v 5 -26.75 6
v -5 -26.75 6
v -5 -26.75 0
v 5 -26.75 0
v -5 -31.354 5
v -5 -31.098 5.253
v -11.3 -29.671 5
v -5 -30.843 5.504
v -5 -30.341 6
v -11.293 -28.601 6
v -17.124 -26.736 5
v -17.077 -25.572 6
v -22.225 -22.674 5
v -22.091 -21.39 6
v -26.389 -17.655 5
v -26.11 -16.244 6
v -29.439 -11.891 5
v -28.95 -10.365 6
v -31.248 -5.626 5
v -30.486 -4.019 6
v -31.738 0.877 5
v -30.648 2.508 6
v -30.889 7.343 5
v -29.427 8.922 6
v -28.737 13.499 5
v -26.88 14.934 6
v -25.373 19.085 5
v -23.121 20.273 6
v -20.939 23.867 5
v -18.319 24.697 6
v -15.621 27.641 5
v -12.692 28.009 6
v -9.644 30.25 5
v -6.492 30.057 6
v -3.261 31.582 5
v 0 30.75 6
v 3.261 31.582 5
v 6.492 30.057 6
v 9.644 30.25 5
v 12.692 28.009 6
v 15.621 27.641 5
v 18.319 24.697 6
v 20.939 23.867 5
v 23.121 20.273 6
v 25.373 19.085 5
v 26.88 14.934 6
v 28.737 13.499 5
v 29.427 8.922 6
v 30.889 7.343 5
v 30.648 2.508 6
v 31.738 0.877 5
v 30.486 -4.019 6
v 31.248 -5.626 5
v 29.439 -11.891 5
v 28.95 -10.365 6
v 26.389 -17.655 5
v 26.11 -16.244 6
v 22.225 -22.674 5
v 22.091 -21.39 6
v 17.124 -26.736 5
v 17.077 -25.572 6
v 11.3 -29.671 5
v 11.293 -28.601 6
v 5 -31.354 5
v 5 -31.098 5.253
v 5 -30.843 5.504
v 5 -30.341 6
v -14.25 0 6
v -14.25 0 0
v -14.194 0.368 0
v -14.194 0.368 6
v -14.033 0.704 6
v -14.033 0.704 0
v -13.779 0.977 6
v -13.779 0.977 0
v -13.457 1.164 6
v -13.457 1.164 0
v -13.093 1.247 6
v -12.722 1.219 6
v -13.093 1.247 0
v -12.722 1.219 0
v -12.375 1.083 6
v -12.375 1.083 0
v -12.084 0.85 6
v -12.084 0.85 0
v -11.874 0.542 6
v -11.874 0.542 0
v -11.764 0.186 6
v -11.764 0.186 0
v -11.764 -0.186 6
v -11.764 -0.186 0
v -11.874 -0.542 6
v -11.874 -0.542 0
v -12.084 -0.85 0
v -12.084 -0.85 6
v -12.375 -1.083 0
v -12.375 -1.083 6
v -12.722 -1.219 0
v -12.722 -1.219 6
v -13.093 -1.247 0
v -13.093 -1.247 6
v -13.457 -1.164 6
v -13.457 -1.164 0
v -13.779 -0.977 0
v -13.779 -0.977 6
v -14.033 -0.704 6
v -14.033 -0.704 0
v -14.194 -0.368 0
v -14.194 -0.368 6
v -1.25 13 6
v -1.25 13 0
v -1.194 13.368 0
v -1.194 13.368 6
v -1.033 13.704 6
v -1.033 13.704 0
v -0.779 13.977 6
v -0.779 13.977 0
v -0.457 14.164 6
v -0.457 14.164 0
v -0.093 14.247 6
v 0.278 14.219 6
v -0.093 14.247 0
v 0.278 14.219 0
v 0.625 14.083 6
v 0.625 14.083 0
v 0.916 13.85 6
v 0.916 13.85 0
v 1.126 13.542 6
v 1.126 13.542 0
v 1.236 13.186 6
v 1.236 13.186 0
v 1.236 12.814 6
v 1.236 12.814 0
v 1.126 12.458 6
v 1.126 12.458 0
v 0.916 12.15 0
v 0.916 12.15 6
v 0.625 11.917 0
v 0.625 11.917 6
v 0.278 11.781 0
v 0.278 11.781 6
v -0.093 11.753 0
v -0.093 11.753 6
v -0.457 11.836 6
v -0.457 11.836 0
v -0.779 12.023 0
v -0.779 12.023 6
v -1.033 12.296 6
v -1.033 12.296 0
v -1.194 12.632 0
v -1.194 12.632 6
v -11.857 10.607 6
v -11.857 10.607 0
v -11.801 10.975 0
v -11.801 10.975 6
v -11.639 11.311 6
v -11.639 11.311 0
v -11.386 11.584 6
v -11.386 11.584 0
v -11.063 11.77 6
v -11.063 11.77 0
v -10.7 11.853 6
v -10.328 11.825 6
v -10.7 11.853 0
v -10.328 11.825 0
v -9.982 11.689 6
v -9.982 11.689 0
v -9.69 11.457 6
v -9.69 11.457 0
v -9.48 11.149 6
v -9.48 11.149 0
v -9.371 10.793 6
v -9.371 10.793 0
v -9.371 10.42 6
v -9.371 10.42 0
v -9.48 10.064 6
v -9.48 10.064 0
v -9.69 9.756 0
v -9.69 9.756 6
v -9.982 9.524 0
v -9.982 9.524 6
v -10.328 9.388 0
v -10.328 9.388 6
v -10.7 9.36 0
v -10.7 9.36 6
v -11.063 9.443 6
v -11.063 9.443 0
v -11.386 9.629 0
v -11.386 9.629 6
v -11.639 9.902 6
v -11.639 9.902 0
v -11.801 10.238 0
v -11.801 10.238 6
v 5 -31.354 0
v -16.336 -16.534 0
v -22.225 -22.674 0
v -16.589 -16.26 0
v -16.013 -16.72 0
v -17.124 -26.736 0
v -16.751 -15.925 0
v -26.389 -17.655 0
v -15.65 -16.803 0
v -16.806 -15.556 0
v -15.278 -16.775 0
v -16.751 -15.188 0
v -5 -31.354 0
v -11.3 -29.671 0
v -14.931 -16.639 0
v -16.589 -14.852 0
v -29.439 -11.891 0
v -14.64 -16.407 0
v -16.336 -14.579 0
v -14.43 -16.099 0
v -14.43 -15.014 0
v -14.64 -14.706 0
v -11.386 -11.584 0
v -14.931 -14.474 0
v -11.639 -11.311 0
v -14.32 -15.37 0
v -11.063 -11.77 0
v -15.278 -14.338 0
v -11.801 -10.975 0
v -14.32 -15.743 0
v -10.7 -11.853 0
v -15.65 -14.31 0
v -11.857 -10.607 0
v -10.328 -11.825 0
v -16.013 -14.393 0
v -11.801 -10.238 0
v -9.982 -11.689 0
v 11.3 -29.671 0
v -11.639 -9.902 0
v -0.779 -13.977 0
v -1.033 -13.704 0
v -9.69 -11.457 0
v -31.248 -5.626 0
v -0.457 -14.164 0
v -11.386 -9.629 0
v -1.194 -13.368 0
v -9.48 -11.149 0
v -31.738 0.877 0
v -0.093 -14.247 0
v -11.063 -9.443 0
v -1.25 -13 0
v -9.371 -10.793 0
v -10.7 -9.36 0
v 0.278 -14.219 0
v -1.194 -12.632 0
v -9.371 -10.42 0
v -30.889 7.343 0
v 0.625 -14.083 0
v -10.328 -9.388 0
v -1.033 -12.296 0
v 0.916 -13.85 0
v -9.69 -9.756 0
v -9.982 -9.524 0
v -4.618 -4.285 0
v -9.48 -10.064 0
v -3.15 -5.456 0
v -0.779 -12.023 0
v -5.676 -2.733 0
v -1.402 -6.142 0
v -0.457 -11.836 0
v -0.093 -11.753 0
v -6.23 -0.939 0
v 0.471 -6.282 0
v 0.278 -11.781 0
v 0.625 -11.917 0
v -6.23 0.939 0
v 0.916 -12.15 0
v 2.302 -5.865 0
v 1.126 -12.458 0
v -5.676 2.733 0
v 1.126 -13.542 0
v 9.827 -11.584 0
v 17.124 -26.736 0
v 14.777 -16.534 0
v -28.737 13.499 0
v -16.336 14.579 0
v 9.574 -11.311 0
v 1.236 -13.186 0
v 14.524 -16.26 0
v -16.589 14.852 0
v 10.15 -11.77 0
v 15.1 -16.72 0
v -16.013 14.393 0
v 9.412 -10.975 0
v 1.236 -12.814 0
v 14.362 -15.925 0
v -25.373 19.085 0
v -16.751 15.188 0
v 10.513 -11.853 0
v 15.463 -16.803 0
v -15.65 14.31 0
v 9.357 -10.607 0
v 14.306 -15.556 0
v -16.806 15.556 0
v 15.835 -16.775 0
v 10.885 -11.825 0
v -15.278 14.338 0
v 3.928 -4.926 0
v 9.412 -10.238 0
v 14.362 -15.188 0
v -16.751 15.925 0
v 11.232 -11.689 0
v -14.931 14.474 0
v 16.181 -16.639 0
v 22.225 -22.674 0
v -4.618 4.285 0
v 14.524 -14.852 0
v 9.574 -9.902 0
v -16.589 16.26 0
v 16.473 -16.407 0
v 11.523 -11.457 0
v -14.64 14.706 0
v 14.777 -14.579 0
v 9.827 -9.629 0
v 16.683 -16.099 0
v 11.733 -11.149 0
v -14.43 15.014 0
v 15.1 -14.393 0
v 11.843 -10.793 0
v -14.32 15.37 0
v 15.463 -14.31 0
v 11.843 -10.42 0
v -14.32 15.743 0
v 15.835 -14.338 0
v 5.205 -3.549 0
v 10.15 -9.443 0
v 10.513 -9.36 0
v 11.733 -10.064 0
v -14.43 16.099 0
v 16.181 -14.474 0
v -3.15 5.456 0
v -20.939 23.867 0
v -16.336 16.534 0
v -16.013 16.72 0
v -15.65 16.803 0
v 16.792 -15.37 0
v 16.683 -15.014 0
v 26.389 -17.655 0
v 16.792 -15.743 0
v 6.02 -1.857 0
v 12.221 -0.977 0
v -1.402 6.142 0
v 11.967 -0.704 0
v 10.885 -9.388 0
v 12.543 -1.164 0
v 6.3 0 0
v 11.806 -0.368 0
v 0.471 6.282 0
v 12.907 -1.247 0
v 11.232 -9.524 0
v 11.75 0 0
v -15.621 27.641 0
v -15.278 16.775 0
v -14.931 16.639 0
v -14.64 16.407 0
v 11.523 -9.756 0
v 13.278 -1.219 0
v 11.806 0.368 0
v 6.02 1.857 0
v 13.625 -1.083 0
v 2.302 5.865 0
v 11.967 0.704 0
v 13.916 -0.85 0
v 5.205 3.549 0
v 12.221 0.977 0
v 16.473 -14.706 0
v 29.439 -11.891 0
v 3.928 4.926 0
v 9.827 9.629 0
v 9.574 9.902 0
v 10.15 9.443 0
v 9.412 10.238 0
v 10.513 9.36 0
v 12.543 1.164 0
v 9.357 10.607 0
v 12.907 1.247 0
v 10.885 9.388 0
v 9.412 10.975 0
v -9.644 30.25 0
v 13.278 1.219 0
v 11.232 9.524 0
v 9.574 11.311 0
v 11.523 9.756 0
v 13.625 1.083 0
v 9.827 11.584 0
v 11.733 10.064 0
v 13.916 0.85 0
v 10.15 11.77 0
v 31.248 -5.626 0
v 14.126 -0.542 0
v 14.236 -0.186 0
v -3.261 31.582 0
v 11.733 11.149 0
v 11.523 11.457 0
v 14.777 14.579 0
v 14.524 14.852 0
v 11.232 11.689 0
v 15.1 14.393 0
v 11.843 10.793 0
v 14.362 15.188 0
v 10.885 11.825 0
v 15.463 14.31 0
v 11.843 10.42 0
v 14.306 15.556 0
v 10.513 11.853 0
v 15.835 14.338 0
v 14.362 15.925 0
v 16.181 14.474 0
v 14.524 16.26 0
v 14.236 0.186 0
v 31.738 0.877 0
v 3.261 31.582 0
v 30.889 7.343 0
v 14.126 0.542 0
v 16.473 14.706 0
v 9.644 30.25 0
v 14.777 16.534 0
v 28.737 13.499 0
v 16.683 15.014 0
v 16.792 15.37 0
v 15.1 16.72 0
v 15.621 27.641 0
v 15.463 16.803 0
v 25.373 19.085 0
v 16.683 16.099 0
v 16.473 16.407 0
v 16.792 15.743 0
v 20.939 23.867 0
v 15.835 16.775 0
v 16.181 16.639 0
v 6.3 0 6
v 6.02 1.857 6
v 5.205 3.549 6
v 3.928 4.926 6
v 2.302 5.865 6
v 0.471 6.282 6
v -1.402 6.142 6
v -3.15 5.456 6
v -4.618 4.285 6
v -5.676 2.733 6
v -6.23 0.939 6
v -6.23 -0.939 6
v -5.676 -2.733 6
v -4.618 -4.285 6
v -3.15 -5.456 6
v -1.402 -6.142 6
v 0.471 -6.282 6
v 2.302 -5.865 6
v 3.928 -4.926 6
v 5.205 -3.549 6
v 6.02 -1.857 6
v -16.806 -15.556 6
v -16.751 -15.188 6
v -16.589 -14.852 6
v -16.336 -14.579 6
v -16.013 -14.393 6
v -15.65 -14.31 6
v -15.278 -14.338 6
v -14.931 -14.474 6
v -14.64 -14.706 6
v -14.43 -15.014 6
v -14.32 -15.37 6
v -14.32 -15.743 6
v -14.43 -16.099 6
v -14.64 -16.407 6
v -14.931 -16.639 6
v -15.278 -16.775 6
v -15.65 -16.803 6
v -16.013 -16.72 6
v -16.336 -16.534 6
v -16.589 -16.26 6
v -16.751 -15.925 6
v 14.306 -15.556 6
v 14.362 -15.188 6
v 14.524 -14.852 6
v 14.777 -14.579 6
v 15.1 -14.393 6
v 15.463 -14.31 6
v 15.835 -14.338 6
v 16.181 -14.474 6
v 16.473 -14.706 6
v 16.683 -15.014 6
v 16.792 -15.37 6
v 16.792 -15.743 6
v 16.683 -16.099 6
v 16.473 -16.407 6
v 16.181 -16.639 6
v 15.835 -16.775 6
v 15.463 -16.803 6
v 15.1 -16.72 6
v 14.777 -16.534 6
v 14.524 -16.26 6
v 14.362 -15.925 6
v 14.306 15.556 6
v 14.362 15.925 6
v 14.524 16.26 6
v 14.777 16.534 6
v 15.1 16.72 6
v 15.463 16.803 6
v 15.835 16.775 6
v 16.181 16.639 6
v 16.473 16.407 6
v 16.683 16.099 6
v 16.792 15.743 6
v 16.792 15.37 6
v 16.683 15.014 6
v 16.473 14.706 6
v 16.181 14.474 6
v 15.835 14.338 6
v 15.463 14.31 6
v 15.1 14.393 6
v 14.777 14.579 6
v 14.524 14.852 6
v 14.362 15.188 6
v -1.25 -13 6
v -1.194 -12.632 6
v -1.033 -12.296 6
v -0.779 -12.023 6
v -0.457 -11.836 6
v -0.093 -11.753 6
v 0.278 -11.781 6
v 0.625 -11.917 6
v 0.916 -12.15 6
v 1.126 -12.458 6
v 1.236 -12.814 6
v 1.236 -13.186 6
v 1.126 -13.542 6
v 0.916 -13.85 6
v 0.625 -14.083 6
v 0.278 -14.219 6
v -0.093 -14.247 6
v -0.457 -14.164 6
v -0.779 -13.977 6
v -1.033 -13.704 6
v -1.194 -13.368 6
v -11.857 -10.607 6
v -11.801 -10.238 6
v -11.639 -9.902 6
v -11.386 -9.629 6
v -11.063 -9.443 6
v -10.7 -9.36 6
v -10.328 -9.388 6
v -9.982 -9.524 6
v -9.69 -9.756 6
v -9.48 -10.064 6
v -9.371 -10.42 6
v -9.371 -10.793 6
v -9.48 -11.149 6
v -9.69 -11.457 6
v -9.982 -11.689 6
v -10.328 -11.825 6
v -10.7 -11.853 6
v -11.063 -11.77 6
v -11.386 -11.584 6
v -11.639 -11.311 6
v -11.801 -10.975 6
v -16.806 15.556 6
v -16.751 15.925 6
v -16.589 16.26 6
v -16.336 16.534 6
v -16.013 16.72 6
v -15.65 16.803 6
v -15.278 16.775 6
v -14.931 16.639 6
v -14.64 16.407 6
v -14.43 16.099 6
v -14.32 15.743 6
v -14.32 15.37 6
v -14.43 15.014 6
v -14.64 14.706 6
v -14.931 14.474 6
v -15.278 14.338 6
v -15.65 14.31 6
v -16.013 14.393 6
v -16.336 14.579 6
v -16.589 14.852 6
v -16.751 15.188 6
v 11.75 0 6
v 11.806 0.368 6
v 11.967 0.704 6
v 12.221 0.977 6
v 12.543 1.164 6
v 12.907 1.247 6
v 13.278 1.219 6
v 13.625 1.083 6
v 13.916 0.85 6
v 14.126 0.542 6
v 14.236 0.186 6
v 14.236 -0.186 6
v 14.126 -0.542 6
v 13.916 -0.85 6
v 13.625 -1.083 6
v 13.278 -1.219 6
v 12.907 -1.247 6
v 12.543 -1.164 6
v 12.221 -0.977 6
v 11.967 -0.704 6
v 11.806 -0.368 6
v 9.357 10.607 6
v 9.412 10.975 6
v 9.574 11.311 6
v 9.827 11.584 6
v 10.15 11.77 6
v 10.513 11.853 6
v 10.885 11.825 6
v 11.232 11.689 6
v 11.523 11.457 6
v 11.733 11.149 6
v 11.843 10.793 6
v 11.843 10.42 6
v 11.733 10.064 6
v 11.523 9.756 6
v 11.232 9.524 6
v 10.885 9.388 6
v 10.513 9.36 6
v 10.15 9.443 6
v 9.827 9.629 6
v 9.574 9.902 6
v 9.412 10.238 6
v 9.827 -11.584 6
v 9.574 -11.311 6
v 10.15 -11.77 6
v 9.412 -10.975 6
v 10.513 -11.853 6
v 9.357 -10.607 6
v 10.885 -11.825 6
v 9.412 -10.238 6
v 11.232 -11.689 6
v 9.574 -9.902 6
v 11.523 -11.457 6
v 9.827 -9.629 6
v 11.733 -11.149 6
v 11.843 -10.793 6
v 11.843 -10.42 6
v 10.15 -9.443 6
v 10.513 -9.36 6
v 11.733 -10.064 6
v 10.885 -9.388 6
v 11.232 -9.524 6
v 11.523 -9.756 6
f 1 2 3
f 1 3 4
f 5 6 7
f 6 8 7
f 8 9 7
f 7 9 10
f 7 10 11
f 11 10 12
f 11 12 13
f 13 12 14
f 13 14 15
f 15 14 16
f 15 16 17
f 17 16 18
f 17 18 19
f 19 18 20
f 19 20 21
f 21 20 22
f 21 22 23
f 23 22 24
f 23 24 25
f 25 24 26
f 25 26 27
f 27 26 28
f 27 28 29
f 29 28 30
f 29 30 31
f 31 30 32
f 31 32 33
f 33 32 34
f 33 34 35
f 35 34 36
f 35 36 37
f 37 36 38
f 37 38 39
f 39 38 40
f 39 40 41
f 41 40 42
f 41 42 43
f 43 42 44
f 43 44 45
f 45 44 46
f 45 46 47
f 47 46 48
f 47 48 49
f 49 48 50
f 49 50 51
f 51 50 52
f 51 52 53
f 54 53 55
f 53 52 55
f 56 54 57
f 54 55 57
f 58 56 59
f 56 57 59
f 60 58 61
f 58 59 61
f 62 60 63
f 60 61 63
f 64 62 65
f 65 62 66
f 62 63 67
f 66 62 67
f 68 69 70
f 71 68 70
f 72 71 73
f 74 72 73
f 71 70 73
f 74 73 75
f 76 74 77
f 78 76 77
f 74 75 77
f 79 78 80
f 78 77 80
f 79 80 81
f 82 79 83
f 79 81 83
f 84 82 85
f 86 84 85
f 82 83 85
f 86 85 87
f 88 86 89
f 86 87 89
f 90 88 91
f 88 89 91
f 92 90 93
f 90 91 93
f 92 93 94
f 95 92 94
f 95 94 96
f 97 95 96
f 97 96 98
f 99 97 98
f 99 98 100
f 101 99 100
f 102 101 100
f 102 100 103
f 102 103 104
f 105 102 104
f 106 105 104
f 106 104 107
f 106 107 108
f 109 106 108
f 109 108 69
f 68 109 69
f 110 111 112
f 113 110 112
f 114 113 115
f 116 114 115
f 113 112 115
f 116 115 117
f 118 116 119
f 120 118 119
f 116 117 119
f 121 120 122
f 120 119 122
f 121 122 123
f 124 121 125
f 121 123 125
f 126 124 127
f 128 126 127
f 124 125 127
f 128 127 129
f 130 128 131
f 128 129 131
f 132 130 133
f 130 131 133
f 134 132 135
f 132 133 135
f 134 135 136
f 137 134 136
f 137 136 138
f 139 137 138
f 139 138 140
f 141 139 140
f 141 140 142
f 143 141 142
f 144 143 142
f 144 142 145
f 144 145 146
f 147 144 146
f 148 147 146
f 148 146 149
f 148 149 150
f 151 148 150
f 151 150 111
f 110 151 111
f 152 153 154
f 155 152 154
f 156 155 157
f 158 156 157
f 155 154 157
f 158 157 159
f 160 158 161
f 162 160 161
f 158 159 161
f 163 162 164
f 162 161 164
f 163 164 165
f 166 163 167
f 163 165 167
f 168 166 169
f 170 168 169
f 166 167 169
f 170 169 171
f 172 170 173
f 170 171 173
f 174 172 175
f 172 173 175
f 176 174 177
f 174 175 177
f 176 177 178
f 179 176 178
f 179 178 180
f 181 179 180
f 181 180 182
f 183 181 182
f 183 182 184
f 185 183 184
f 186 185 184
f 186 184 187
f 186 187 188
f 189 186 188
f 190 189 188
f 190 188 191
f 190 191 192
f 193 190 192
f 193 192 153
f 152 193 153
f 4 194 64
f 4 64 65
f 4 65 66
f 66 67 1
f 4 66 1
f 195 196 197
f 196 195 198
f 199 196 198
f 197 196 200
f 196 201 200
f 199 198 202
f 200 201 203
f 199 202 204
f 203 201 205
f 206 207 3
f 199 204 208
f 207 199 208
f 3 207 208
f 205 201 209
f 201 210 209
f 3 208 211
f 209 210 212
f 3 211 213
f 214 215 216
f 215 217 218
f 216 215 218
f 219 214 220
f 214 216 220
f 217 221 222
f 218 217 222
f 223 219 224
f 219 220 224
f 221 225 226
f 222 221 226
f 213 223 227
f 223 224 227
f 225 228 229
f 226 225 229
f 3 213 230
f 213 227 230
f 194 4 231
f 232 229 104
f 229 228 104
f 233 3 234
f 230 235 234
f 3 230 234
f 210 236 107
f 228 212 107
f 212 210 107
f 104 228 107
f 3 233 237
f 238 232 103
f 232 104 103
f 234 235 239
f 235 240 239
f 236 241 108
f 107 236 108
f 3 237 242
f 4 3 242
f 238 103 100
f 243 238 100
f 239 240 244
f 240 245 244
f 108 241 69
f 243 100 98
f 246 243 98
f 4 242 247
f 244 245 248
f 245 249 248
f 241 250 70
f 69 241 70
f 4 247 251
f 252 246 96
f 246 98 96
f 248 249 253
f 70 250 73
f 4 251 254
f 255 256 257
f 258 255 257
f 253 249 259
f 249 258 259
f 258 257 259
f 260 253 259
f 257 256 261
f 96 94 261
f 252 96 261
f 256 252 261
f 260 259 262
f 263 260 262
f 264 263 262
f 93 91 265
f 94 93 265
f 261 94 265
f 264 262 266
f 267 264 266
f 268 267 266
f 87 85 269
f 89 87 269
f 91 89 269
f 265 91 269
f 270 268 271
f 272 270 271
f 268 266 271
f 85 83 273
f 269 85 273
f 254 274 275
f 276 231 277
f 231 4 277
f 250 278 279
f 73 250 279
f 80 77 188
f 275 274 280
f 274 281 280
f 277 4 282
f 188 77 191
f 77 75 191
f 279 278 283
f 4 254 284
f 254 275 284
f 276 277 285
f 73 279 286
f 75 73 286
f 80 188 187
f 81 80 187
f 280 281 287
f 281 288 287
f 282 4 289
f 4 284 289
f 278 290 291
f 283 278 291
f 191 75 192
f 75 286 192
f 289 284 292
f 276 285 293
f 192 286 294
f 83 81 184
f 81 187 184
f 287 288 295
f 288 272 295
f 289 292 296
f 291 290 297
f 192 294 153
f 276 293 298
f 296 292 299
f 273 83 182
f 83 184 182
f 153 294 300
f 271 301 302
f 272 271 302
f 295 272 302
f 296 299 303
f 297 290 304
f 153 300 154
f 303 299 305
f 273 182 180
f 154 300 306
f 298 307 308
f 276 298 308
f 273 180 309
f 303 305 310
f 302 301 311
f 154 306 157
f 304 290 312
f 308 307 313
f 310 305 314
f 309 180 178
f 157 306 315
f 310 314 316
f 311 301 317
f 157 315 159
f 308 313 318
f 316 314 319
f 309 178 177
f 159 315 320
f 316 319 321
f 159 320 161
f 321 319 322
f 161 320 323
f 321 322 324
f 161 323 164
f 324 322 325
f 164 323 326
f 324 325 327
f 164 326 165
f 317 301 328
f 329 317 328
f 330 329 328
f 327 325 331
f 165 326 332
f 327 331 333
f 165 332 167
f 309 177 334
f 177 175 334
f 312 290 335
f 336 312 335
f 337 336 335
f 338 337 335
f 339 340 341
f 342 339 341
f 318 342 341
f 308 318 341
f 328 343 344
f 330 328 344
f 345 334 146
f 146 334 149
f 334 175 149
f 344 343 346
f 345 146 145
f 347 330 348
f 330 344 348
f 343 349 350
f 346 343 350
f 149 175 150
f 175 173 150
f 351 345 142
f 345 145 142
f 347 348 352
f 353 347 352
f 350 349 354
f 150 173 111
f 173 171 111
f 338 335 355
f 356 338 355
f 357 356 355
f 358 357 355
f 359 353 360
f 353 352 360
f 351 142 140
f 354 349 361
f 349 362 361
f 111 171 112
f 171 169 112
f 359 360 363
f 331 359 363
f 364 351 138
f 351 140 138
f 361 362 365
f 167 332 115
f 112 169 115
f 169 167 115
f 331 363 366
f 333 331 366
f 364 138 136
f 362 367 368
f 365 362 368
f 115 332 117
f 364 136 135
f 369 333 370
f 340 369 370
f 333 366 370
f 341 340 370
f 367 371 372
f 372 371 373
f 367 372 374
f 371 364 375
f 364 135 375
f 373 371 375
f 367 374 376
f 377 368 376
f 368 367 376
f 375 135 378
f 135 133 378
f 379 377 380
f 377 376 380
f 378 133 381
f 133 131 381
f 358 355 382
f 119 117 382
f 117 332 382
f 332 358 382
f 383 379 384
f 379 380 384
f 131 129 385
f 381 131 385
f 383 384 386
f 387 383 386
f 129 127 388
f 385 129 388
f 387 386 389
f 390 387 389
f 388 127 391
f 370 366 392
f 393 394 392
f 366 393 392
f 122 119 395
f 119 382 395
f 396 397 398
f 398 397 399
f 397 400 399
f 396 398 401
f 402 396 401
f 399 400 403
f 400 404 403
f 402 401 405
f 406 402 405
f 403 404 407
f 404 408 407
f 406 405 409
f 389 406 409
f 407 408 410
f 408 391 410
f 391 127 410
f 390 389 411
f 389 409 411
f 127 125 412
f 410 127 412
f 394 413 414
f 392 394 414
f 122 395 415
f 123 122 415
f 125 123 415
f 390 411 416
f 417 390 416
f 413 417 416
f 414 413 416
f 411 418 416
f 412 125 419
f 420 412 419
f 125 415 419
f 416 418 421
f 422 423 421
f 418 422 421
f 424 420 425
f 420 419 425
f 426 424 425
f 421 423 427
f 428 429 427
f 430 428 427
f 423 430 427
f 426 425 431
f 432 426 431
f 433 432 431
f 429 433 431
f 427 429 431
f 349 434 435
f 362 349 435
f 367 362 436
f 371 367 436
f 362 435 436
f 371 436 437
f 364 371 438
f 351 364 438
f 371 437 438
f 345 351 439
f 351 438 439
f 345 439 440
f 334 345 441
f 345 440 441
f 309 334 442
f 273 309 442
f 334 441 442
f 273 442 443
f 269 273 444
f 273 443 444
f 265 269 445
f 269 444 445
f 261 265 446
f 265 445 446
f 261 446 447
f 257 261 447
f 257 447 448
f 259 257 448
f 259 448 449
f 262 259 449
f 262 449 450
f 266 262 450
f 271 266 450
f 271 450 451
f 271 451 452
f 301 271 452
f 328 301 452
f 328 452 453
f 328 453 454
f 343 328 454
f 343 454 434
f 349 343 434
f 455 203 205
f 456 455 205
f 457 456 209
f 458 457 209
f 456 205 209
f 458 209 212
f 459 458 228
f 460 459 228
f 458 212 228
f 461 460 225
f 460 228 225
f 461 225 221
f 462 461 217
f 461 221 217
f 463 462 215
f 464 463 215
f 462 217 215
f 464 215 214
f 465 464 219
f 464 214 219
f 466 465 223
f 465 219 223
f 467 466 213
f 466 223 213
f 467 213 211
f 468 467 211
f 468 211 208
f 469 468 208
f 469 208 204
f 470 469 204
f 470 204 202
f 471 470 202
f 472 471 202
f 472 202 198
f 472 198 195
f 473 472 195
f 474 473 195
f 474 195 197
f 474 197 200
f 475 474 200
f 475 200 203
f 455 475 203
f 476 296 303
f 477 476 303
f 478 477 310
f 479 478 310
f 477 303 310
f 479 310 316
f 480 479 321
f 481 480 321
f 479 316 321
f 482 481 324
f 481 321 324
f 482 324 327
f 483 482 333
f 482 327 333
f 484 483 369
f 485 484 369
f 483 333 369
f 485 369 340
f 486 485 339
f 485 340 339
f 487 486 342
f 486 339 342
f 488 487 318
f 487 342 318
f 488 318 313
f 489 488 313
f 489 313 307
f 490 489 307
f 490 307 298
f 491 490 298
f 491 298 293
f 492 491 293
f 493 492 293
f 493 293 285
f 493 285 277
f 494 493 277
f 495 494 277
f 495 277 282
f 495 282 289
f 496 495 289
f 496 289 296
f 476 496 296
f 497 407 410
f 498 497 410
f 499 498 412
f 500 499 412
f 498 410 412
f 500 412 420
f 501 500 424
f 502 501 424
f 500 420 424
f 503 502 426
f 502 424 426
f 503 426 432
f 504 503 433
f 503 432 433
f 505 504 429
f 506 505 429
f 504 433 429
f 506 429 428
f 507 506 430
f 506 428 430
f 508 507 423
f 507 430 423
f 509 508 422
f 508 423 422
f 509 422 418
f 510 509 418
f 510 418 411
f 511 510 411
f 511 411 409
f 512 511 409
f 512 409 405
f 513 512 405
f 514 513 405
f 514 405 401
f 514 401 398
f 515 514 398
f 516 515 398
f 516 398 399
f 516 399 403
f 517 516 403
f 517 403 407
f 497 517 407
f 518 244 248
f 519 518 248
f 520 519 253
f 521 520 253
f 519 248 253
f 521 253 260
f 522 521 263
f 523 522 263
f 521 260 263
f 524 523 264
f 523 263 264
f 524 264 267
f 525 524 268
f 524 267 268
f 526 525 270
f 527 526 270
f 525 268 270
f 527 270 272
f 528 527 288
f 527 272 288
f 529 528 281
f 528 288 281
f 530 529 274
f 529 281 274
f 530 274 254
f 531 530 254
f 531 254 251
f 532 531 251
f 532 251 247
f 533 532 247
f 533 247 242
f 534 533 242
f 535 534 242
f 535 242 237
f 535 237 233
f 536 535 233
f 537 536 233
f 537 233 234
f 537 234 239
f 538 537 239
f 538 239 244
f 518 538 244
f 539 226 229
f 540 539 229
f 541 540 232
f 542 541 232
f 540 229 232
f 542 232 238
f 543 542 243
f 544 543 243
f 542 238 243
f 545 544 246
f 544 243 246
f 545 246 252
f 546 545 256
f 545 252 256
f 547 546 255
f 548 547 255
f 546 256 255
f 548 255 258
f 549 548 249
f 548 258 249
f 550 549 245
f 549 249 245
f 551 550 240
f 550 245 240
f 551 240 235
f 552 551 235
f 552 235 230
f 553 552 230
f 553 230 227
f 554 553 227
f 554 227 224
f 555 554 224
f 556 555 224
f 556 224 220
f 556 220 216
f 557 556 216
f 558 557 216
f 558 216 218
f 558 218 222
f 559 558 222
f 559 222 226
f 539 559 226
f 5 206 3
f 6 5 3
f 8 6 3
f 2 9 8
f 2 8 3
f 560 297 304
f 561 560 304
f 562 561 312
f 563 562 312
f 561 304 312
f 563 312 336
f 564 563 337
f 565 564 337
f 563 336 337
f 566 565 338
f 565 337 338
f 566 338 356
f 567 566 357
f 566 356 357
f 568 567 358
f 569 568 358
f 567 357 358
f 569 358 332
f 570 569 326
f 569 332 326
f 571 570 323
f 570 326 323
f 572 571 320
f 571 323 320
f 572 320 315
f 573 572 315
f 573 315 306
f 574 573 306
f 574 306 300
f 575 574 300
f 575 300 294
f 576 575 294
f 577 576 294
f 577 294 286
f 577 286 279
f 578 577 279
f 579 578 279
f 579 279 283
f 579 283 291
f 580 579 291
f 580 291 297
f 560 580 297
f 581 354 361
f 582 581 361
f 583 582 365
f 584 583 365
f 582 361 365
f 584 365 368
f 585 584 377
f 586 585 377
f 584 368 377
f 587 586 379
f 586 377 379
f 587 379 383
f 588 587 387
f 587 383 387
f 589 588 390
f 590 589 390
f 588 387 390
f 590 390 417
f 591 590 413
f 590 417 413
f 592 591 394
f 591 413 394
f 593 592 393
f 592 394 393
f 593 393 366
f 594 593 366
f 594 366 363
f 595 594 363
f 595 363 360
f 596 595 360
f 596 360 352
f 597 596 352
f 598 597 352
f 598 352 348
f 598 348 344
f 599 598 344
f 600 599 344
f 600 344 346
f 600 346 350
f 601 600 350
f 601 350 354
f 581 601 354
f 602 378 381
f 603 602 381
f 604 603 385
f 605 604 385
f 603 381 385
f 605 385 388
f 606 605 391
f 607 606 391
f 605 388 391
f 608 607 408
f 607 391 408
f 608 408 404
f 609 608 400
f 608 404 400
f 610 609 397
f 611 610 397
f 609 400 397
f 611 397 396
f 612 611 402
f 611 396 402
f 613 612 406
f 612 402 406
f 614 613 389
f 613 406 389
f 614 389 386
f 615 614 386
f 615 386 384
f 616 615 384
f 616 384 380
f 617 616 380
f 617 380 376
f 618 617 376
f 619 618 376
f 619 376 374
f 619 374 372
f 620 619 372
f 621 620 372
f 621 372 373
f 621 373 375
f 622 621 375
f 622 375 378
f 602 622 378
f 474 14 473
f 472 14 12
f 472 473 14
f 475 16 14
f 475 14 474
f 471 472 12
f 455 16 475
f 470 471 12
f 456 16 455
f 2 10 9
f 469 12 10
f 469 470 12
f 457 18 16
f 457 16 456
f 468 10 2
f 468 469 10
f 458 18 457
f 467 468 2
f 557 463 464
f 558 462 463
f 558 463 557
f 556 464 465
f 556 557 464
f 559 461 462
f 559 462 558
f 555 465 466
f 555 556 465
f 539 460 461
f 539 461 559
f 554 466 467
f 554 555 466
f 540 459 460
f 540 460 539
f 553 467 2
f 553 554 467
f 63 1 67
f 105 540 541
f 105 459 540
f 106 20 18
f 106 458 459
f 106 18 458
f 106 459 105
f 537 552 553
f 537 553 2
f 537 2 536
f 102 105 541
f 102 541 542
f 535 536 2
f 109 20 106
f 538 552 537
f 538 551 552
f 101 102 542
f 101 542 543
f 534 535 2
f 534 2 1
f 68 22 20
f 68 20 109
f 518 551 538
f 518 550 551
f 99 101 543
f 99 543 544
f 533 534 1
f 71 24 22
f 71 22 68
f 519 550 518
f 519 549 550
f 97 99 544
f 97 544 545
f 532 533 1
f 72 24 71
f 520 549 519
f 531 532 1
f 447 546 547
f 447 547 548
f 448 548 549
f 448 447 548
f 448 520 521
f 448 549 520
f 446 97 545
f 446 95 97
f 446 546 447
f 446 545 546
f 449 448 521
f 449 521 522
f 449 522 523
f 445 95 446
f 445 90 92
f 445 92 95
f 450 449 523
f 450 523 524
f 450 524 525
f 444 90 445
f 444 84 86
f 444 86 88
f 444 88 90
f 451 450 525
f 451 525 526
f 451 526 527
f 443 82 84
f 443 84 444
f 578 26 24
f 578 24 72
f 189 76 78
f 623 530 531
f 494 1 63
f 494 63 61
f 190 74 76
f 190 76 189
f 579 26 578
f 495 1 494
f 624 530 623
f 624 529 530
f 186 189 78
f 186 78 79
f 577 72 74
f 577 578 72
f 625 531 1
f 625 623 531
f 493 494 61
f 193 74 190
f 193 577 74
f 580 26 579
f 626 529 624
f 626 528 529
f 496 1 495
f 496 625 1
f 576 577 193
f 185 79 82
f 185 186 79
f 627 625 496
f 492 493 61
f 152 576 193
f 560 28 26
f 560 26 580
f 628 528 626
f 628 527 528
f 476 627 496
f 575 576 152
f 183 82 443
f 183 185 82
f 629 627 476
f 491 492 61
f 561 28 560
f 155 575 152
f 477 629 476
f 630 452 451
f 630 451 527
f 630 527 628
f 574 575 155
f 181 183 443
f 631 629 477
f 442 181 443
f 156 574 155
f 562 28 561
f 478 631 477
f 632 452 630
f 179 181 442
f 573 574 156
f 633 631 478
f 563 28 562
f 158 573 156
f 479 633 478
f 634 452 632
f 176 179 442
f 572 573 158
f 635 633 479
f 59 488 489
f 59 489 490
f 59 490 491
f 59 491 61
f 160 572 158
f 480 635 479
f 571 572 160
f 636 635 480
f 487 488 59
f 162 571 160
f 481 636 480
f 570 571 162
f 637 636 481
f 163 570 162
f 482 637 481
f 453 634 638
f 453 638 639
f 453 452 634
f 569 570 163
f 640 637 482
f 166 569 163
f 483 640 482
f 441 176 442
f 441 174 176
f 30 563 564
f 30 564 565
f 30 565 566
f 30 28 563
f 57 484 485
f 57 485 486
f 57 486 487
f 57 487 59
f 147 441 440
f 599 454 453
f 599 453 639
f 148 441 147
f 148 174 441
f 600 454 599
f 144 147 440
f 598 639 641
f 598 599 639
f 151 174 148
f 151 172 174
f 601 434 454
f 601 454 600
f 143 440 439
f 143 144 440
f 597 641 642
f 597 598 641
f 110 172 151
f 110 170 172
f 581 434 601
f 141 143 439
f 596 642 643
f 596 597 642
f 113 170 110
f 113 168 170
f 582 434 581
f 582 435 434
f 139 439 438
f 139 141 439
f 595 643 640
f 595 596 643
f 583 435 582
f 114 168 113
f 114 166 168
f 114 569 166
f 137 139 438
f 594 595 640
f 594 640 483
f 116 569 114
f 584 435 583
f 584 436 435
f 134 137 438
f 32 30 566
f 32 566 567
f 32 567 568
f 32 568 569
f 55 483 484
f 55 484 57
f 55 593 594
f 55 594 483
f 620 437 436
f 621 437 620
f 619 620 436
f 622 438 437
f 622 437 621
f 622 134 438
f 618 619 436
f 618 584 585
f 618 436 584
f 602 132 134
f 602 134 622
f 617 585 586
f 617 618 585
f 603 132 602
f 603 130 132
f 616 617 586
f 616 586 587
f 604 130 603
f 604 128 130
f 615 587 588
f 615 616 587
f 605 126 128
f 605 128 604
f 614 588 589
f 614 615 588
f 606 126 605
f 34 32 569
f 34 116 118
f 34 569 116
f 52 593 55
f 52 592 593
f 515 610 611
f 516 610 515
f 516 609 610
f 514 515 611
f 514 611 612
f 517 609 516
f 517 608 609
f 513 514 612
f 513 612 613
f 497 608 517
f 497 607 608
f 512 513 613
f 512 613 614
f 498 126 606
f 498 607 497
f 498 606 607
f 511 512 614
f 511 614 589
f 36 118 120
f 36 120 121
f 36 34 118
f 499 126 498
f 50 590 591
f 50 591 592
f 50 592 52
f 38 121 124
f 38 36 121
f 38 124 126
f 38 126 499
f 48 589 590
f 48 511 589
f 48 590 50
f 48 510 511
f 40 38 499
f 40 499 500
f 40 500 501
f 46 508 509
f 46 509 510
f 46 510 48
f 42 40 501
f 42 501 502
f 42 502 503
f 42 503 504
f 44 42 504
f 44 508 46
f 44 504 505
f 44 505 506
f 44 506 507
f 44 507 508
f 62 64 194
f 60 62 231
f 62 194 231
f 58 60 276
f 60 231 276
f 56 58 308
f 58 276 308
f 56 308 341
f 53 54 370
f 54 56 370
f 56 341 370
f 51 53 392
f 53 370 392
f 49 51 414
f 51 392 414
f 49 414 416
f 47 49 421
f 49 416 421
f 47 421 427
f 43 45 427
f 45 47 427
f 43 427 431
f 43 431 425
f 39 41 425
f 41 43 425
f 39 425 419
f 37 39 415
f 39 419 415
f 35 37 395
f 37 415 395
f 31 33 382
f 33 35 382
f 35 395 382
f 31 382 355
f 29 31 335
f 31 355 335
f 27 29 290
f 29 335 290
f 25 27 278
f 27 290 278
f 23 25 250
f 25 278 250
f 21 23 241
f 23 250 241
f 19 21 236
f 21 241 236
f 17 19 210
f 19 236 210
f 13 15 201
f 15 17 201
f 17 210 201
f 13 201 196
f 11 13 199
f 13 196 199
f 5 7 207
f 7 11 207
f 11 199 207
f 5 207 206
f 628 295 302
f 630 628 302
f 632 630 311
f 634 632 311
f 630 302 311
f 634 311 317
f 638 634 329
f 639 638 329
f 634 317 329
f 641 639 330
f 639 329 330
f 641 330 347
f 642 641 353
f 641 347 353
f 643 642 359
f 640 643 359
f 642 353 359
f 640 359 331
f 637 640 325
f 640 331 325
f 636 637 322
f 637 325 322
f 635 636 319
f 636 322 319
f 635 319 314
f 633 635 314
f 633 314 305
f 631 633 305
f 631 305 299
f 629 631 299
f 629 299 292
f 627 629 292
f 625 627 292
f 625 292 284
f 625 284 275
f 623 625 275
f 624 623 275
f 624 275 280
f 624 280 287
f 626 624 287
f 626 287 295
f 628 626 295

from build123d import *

# Parameters (mm, degrees)
SKETCH_1_R          = 31.75
EXTRUDE_1_DEPTH     = 6
SKETCH_2_W          = 10
SKETCH_2_H          = 10
CUT_EXTRUDE_1_DEPTH = 7
M3X0_52_D           = 2.5
M3X0_51_D           = 2.5
SKETCH_8_R          = 6.3
CUT_EXTRUDE_2_DEPTH = 7
CHAMFER_1_SIZE      = 1


with BuildPart() as part:
    # Эскиз1 → Бобышка-Вытянуть1 (new body)
    with BuildSketch(Plane.XY):
        Circle(SKETCH_1_R)
    extrude(amount=EXTRUDE_1_DEPTH)

    # Эскиз2 → Вырез-Вытянуть1 (cut, through all)
    with BuildSketch(Plane.XY.offset(6)):
        with Locations((0, -31.75)):
            Rectangle(SKETCH_2_W, SKETCH_2_H)
    extrude(amount=-CUT_EXTRUDE_1_DEPTH, mode=Mode.SUBTRACT)

    # Отверстие обработанное метчиком M3x0.52 (through all)
    with Locations(Plane.XY.offset(6)):
        with Locations((0, 13), (13, 0), (-13, 0), (0, -13)):
            Hole(M3X0_52_D / 2)

    # Отверстие обработанное метчиком M3x0.51 (through all)
    with Locations(Plane.XY.offset(6)):
        with Locations((-15.556349186, 15.556349186), (-15.556349186, -15.556349186), (15.556349186, -15.556349186), (15.556349186, 15.556349186), (10.606601718, 10.606601718), (-10.606601718, 10.606601718), (-10.606601718, -10.606601718), (10.606601718, -10.606601718)):
            Hole(M3X0_51_D / 2)

    # Эскиз8 → Вырез-Вытянуть2 (cut, through all)
    with BuildSketch(Plane.XY.offset(6)):
        Circle(SKETCH_8_R)
    extrude(amount=-CUT_EXTRUDE_2_DEPTH, mode=Mode.SUBTRACT)

    # Фаска1
    chamfer_1_edges = [part.edges().sort_by_distance(p)[0] for p in [
        (0, 31.75, 6),
    ]]
    chamfer(chamfer_1_edges, length=CHAMFER_1_SIZE)


solid = part.part
